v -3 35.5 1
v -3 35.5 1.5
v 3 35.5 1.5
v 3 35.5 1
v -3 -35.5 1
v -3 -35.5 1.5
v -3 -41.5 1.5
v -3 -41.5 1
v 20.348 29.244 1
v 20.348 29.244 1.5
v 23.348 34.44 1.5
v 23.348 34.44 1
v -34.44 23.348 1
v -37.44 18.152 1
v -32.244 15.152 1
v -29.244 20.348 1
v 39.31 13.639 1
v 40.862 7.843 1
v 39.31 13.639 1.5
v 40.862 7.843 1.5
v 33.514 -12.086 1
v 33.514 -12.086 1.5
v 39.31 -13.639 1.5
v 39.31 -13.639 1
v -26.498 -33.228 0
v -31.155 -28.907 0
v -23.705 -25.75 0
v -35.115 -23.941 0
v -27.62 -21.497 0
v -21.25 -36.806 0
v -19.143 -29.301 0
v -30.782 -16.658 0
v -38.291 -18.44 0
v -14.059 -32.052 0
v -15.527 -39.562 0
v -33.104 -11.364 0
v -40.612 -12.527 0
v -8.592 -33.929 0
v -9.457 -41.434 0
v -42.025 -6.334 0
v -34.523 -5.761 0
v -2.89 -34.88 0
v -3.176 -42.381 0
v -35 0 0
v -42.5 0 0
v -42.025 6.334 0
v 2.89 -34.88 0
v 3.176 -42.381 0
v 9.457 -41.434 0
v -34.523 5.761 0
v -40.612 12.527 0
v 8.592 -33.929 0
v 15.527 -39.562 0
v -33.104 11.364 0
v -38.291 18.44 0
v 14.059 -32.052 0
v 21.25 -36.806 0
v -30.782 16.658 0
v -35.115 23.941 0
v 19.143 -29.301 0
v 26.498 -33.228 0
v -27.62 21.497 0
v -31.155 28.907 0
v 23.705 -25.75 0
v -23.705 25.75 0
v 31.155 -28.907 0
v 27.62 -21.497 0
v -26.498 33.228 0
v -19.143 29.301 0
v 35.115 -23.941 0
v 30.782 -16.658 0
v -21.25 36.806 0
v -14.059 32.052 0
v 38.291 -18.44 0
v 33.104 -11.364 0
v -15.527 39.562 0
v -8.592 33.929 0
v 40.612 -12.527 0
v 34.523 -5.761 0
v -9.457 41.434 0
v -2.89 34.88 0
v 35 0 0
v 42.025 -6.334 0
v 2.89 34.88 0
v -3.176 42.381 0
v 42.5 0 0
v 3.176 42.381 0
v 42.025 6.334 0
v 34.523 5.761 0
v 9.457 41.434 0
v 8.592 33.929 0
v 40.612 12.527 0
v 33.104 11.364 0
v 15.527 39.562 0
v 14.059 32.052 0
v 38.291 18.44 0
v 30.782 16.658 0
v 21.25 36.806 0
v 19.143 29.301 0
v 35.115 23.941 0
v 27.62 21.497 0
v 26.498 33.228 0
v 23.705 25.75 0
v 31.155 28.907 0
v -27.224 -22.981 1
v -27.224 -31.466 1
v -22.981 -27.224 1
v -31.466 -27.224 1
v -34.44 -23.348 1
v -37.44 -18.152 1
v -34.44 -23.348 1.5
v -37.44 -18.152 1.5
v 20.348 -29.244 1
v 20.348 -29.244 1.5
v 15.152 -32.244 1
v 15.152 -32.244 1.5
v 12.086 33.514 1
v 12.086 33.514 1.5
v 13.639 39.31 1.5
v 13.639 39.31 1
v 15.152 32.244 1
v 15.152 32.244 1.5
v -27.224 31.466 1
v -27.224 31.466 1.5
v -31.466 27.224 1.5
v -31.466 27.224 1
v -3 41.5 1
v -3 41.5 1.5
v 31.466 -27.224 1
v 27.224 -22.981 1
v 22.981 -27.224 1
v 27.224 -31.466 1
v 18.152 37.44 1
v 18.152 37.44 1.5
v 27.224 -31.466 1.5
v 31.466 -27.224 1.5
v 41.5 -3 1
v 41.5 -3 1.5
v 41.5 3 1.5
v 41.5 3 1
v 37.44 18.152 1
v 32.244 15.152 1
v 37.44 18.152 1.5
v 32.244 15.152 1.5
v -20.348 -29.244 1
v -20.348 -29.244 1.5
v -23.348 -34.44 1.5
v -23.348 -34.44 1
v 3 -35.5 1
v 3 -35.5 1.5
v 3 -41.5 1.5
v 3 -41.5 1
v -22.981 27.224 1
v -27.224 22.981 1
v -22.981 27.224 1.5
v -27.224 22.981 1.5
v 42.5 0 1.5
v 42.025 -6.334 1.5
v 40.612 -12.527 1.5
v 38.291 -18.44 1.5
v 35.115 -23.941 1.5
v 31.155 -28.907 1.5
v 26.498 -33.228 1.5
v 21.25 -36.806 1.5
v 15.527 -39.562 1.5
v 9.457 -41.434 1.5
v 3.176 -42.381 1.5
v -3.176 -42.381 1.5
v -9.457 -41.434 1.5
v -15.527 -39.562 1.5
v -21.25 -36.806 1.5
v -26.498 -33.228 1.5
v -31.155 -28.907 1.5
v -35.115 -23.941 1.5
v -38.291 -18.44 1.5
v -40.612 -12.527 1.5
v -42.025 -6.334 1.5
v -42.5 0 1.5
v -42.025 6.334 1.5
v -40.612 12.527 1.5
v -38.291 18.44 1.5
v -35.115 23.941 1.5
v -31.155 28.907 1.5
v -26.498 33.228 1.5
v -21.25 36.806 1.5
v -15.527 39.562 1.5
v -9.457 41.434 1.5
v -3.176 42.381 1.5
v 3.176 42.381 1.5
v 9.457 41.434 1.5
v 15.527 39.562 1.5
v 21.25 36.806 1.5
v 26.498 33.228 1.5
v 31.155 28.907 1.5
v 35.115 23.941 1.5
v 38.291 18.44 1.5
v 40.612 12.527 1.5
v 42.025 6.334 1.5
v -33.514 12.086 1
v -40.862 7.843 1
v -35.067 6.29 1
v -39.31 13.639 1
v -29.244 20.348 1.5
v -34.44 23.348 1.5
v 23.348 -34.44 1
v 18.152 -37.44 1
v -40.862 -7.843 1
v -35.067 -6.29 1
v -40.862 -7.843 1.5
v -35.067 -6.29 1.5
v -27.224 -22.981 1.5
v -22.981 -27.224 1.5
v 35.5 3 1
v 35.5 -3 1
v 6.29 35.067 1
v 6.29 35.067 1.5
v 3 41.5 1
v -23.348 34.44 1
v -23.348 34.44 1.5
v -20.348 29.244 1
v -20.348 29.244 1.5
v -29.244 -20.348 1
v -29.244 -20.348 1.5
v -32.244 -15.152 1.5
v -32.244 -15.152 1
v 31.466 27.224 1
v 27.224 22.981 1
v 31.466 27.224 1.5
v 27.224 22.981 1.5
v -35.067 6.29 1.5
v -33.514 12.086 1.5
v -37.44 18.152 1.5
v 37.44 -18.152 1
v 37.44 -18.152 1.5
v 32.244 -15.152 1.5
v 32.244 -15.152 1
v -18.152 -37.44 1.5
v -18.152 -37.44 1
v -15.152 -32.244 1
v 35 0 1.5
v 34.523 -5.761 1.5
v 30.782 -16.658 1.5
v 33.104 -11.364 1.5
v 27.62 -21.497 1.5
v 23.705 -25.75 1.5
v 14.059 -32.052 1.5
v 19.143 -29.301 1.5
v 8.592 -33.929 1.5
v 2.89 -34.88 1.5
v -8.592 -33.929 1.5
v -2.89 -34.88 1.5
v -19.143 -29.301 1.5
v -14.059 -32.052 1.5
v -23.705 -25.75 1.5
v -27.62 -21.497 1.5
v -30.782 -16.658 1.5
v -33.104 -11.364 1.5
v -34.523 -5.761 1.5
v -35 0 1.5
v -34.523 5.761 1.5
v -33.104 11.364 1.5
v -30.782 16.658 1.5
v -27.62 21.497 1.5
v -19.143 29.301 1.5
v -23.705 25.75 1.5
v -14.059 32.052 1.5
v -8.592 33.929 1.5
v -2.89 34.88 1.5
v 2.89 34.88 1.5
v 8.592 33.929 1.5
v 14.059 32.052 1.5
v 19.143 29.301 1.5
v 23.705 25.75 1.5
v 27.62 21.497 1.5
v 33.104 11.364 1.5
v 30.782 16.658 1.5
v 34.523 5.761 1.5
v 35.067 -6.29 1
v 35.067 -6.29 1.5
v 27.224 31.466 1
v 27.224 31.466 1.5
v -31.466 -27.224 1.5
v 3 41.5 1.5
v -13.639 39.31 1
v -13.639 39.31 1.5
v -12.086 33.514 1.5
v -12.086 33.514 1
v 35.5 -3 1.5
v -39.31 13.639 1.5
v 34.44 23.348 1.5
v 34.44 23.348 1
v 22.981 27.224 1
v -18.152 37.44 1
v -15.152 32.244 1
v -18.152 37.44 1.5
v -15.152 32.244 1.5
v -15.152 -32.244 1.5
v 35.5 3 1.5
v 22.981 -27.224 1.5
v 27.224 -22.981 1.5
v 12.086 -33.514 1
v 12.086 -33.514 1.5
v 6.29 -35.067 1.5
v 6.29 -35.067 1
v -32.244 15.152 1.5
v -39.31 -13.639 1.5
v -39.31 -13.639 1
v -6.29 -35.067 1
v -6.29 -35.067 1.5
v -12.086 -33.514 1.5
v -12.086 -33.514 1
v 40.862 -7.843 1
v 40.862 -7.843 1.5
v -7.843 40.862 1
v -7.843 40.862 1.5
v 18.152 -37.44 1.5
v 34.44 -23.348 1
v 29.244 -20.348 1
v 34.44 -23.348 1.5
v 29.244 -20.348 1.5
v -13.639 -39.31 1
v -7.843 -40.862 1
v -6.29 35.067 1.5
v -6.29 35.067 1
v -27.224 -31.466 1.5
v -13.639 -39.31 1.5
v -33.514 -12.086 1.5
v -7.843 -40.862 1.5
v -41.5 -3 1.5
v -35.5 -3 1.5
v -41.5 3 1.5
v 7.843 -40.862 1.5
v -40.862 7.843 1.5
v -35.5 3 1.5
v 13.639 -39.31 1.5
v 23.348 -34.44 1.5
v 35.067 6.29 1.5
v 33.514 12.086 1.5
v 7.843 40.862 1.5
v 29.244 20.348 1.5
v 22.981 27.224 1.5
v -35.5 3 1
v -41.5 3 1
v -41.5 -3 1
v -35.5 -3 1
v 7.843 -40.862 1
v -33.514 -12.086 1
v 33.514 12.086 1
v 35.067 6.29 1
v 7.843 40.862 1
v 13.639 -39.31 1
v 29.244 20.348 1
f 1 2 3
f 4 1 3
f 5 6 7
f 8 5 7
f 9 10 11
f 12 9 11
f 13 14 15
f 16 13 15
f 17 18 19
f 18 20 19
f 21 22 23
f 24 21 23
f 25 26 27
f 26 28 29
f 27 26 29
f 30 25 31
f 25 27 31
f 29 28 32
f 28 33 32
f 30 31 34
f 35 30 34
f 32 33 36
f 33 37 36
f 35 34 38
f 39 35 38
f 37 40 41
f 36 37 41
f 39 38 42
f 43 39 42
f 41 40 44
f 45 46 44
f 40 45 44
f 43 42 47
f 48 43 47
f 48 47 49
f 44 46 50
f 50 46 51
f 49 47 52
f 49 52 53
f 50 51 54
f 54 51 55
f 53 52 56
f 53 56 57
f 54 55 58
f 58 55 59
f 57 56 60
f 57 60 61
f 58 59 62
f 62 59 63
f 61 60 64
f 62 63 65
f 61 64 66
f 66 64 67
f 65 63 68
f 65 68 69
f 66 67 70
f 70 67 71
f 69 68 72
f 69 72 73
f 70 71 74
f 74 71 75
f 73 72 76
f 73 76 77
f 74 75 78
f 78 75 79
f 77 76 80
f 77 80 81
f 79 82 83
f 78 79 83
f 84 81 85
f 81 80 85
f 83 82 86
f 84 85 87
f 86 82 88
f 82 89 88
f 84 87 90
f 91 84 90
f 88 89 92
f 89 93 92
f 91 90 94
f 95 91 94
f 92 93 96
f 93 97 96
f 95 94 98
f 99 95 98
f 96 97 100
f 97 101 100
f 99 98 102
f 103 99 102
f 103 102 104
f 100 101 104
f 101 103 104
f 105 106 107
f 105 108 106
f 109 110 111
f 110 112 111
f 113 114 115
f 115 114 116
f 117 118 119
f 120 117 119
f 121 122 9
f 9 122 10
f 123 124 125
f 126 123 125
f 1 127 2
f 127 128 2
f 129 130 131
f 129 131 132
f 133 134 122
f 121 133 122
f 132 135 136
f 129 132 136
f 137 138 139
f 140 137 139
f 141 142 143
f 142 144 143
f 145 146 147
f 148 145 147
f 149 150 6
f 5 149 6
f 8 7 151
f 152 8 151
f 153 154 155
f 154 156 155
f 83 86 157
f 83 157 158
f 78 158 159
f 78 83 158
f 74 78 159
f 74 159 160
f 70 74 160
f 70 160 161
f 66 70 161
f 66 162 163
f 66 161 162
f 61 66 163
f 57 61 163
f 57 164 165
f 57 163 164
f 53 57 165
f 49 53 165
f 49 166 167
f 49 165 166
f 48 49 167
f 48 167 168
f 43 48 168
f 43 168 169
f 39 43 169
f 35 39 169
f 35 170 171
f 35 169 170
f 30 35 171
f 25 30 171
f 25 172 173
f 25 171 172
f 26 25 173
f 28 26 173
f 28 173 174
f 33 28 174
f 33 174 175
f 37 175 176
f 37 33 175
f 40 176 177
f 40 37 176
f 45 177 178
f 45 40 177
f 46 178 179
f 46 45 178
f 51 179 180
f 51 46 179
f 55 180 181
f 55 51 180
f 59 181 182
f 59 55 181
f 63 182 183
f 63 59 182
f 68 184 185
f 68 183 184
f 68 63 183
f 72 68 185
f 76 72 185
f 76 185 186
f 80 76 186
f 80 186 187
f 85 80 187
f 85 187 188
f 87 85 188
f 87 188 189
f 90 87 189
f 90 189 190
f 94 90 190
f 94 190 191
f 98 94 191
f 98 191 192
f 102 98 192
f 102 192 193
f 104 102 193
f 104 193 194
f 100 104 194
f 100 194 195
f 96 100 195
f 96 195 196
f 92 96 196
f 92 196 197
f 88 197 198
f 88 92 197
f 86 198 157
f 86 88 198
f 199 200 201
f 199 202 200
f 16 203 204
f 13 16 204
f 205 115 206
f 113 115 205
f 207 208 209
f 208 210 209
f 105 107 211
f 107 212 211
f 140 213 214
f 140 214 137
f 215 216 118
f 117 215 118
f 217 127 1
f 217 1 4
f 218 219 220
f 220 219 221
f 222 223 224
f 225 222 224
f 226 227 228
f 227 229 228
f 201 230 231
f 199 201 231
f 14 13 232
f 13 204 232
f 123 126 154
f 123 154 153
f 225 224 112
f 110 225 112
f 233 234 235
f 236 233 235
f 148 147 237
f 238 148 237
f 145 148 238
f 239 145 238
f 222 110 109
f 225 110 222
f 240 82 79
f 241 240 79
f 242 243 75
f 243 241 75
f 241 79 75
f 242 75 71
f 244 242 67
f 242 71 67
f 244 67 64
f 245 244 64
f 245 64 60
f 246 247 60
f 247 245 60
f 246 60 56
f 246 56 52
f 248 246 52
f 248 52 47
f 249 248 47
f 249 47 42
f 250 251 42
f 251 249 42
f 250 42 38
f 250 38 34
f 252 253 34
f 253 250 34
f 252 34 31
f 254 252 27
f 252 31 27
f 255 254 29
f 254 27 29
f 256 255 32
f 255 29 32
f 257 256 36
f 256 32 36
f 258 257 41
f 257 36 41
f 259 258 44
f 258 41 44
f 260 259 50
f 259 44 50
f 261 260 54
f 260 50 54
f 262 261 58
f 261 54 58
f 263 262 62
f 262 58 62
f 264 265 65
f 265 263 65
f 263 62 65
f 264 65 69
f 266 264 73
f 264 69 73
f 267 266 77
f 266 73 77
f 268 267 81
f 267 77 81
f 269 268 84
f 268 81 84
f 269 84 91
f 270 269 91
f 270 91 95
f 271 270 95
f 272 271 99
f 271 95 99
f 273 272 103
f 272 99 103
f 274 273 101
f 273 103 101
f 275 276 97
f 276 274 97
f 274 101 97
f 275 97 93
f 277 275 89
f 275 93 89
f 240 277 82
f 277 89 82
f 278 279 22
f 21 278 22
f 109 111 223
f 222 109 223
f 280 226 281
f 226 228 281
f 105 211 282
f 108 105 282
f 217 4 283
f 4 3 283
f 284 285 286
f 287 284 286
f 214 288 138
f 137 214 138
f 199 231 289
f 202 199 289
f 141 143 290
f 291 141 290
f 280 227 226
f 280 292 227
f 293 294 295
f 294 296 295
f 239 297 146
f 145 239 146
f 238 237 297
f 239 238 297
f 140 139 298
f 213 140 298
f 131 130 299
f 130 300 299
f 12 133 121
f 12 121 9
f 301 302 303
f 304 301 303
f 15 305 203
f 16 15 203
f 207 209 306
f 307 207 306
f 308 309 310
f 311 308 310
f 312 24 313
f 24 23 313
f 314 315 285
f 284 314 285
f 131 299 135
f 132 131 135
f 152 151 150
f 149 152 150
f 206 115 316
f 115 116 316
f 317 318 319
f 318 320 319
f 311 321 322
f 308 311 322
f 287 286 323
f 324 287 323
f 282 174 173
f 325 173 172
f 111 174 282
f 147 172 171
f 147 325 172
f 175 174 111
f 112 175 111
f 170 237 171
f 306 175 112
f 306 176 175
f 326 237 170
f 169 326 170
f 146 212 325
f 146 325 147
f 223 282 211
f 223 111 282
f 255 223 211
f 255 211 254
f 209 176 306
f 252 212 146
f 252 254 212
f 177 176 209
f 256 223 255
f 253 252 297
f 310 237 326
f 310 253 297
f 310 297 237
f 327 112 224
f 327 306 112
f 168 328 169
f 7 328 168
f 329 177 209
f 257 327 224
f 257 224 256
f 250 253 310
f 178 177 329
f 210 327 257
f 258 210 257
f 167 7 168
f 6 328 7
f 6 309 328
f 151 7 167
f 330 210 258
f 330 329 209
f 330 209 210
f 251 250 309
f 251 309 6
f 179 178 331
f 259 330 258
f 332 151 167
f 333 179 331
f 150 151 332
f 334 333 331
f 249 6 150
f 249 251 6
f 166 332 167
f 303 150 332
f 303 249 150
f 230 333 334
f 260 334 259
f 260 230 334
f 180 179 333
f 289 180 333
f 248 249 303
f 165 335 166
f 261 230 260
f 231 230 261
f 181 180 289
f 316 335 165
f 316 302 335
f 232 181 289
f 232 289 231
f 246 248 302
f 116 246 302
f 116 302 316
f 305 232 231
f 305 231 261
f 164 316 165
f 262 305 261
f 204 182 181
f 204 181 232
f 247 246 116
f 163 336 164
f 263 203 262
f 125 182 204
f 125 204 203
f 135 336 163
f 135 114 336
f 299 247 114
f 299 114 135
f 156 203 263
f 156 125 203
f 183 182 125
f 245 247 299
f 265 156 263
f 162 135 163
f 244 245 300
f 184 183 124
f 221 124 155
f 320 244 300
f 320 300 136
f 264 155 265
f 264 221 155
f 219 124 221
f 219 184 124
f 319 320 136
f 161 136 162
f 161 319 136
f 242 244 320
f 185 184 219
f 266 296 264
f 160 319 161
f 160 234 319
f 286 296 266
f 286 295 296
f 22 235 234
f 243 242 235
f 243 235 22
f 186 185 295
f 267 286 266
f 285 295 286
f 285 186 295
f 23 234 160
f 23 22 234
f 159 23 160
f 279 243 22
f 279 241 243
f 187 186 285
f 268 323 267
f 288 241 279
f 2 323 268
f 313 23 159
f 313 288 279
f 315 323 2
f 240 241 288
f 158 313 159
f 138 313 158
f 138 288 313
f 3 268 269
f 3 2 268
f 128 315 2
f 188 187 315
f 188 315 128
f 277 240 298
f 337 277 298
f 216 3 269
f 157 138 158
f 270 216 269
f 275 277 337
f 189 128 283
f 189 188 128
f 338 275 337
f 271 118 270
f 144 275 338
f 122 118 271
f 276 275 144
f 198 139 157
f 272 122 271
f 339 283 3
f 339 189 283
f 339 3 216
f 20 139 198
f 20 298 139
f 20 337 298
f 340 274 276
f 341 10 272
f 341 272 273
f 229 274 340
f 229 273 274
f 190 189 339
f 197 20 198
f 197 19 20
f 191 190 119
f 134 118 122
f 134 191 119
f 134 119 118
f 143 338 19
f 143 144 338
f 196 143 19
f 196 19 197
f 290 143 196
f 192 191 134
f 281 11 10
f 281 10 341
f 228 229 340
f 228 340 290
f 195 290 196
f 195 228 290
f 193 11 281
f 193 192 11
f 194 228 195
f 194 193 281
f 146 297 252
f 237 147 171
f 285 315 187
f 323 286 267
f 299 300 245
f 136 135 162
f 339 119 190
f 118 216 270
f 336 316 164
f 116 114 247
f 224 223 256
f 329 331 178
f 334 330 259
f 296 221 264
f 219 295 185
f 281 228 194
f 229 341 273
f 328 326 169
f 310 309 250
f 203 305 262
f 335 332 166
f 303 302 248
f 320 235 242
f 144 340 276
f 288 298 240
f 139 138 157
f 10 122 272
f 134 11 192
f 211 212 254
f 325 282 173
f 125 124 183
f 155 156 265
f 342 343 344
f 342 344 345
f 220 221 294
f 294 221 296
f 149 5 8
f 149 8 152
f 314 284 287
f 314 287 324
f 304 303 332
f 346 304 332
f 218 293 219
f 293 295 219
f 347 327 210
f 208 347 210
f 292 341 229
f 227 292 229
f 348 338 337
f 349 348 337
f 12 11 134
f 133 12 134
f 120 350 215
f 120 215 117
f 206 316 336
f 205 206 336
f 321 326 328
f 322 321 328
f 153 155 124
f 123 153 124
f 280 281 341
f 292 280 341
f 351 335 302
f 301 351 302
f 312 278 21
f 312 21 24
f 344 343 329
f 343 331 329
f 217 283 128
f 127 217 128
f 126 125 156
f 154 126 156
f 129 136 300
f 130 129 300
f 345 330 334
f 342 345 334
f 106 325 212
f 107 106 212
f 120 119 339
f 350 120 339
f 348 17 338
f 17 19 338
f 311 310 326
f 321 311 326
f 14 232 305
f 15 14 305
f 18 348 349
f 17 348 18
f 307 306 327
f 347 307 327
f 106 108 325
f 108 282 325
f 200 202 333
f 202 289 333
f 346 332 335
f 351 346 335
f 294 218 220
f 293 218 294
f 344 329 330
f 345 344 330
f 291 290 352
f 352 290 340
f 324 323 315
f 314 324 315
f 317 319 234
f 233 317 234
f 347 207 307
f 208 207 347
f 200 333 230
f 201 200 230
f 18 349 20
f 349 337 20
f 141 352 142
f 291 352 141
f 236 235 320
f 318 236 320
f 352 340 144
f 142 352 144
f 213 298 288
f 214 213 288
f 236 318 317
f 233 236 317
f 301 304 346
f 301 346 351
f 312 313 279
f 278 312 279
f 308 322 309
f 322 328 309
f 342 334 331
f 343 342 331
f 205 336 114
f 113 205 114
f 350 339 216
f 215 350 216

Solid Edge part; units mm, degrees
sketch "Sketch1" plane through (0, 0, 0) normal (0, 0, 1) x (1, 0, 0)
  circle A0 centre (0, 0) radius 42.5
  circle A1 centre (0, 0) radius 35
extrude "Protrusion1" add sketch "Sketch1" along normal blind 1.5
sketch "Sketch2" plane through (0, 0, 1.5) normal (0, 0, 1) x (1, 0, 0)
  line L0 (-33.5139, 12.0859) -> (-39.3095, 13.6388)
  line L1 (-39.3095, 13.6388) -> (-40.8624, 7.8432)
  line L2 (-40.8624, 7.8432) -> (-35.0668, 6.2903)
  line L3 (-35.0668, 6.2903) -> (-33.5139, 12.0859)
  line L4 (-37.4401, 18.1519) -> (-32.2439, 15.1519)
  line L5 (-32.2439, 15.1519) -> (-29.2439, 20.3481)
  line L6 (-29.2439, 20.3481) -> (-34.4401, 23.3481)
  line L7 (-34.4401, 23.3481) -> (-37.4401, 18.1519)
  line L8 (-27.2236, 22.981) -> (-22.981, 27.2236)
  line L9 (-22.981, 27.2236) -> (-27.2236, 31.4663)
  line L10 (-27.2236, 31.4663) -> (-31.4663, 27.2236)
  line L11 (-31.4663, 27.2236) -> (-27.2236, 22.981)
  line L12 (-23.3481, 34.4401) -> (-20.3481, 29.2439)
  line L13 (-20.3481, 29.2439) -> (-15.1519, 32.2439)
  line L14 (-15.1519, 32.2439) -> (-18.1519, 37.4401)
  line L15 (-18.1519, 37.4401) -> (-23.3481, 34.4401)
  line L16 (-12.0859, 33.5139) -> (-6.2903, 35.0668)
  line L17 (-6.2903, 35.0668) -> (-7.8432, 40.8624)
  line L18 (-7.8432, 40.8624) -> (-13.6388, 39.3095)
  line L19 (-13.6388, 39.3095) -> (-12.0859, 33.5139)
  line L20 (-3, 41.5) -> (-3, 35.5)
  line L21 (-3, 35.5) -> (3, 35.5)
  line L22 (3, 35.5) -> (3, 41.5)
  line L23 (3, 41.5) -> (-3, 41.5)
  line L24 (7.8432, 40.8624) -> (6.2903, 35.0668)
  line L25 (6.2903, 35.0668) -> (12.0859, 33.5139)
  line L26 (12.0859, 33.5139) -> (13.6388, 39.3095)
  line L27 (13.6388, 39.3095) -> (7.8432, 40.8624)
  line L28 (15.1519, 32.2439) -> (20.3481, 29.2439)
  line L29 (20.3481, 29.2439) -> (23.3481, 34.4401)
  line L30 (23.3481, 34.4401) -> (18.1519, 37.4401)
  line L31 (18.1519, 37.4401) -> (15.1519, 32.2439)
  line L32 (27.2236, 31.4663) -> (22.981, 27.2236)
  line L33 (22.981, 27.2236) -> (27.2236, 22.981)
  line L34 (27.2236, 22.981) -> (31.4663, 27.2236)
  line L35 (31.4663, 27.2236) -> (27.2236, 31.4663)
  line L36 (29.2439, 20.3481) -> (32.2439, 15.1519)
  line L37 (32.2439, 15.1519) -> (37.4401, 18.1519)
  line L38 (37.4401, 18.1519) -> (34.4401, 23.3481)
  line L39 (34.4401, 23.3481) -> (29.2439, 20.3481)
  line L40 (39.3095, 13.6388) -> (33.5139, 12.0859)
  line L41 (33.5139, 12.0859) -> (35.0668, 6.2903)
  line L42 (35.0668, 6.2903) -> (40.8624, 7.8432)
  line L43 (40.8624, 7.8432) -> (39.3095, 13.6388)
  line L44 (41.5, 3) -> (35.5, 3)
  line L45 (35.5, 3) -> (35.5, -3)
  line L46 (35.5, -3) -> (41.5, -3)
  line L47 (41.5, -3) -> (41.5, 3)
  line L48 (40.8624, -7.8432) -> (35.0668, -6.2903)
  line L49 (35.0668, -6.2903) -> (33.5139, -12.0859)
  line L50 (33.5139, -12.0859) -> (39.3095, -13.6388)
  line L51 (39.3095, -13.6388) -> (40.8624, -7.8432)
  line L52 (37.4401, -18.1519) -> (32.2439, -15.1519)
  line L53 (32.2439, -15.1519) -> (29.2439, -20.3481)
  line L54 (29.2439, -20.3481) -> (34.4401, -23.3481)
  line L55 (34.4401, -23.3481) -> (37.4401, -18.1519)
  line L56 (31.4663, -27.2236) -> (27.2236, -22.981)
  line L57 (27.2236, -22.981) -> (22.981, -27.2236)
  line L58 (22.981, -27.2236) -> (27.2236, -31.4663)
  line L59 (27.2236, -31.4663) -> (31.4663, -27.2236)
  line L60 (23.3481, -34.4401) -> (20.3481, -29.2439)
  line L61 (20.3481, -29.2439) -> (15.1519, -32.2439)
  line L62 (15.1519, -32.2439) -> (18.1519, -37.4401)
  line L63 (18.1519, -37.4401) -> (23.3481, -34.4401)
  line L64 (13.6388, -39.3095) -> (12.0859, -33.5139)
  line L65 (12.0859, -33.5139) -> (6.2903, -35.0668)
  line L66 (6.2903, -35.0668) -> (7.8432, -40.8624)
  line L67 (7.8432, -40.8624) -> (13.6388, -39.3095)
  line L68 (3, -41.5) -> (3, -35.5)
  line L69 (3, -35.5) -> (-3, -35.5)
  line L70 (-3, -35.5) -> (-3, -41.5)
  line L71 (-3, -41.5) -> (3, -41.5)
  line L72 (-7.8432, -40.8624) -> (-6.2903, -35.0668)
  line L73 (-6.2903, -35.0668) -> (-12.0859, -33.5139)
  line L74 (-12.0859, -33.5139) -> (-13.6388, -39.3095)
  line L75 (-13.6388, -39.3095) -> (-7.8432, -40.8624)
  line L76 (-18.1519, -37.4401) -> (-15.1519, -32.2439)
  line L77 (-15.1519, -32.2439) -> (-20.3481, -29.2439)
  line L78 (-20.3481, -29.2439) -> (-23.3481, -34.4401)
  line L79 (-23.3481, -34.4401) -> (-18.1519, -37.4401)
  line L80 (-27.2236, -31.4663) -> (-22.981, -27.2236)
  line L81 (-22.981, -27.2236) -> (-27.2236, -22.981)
  line L82 (-27.2236, -22.981) -> (-31.4663, -27.2236)
  line L83 (-31.4663, -27.2236) -> (-27.2236, -31.4663)
  line L84 (-34.4401, -23.3481) -> (-29.2439, -20.3481)
  line L85 (-29.2439, -20.3481) -> (-32.2439, -15.1519)
  line L86 (-32.2439, -15.1519) -> (-37.4401, -18.1519)
  line L87 (-37.4401, -18.1519) -> (-34.4401, -23.3481)
  line L88 (-39.3095, -13.6388) -> (-33.5139, -12.0859)
  line L89 (-33.5139, -12.0859) -> (-35.0668, -6.2903)
  line L90 (-35.0668, -6.2903) -> (-40.8624, -7.8432)
  line L91 (-40.8624, -7.8432) -> (-39.3095, -13.6388)
  line L92 (-41.5, -3) -> (-35.5, -3)
  line L93 (-35.5, -3) -> (-35.5, 3)
  line L94 (-35.5, 3) -> (-41.5, 3)
  line L95 (-41.5, 3) -> (-41.5, -3)
  dimension "D1" = 6
  dimension "D2" = 6
  dimension "D3" = 35.5
extrude "ExtrudedCutout_2" cut sketch "Sketch2" against normal blind 0.5
properties material "ABS Plastic, medium impact"
